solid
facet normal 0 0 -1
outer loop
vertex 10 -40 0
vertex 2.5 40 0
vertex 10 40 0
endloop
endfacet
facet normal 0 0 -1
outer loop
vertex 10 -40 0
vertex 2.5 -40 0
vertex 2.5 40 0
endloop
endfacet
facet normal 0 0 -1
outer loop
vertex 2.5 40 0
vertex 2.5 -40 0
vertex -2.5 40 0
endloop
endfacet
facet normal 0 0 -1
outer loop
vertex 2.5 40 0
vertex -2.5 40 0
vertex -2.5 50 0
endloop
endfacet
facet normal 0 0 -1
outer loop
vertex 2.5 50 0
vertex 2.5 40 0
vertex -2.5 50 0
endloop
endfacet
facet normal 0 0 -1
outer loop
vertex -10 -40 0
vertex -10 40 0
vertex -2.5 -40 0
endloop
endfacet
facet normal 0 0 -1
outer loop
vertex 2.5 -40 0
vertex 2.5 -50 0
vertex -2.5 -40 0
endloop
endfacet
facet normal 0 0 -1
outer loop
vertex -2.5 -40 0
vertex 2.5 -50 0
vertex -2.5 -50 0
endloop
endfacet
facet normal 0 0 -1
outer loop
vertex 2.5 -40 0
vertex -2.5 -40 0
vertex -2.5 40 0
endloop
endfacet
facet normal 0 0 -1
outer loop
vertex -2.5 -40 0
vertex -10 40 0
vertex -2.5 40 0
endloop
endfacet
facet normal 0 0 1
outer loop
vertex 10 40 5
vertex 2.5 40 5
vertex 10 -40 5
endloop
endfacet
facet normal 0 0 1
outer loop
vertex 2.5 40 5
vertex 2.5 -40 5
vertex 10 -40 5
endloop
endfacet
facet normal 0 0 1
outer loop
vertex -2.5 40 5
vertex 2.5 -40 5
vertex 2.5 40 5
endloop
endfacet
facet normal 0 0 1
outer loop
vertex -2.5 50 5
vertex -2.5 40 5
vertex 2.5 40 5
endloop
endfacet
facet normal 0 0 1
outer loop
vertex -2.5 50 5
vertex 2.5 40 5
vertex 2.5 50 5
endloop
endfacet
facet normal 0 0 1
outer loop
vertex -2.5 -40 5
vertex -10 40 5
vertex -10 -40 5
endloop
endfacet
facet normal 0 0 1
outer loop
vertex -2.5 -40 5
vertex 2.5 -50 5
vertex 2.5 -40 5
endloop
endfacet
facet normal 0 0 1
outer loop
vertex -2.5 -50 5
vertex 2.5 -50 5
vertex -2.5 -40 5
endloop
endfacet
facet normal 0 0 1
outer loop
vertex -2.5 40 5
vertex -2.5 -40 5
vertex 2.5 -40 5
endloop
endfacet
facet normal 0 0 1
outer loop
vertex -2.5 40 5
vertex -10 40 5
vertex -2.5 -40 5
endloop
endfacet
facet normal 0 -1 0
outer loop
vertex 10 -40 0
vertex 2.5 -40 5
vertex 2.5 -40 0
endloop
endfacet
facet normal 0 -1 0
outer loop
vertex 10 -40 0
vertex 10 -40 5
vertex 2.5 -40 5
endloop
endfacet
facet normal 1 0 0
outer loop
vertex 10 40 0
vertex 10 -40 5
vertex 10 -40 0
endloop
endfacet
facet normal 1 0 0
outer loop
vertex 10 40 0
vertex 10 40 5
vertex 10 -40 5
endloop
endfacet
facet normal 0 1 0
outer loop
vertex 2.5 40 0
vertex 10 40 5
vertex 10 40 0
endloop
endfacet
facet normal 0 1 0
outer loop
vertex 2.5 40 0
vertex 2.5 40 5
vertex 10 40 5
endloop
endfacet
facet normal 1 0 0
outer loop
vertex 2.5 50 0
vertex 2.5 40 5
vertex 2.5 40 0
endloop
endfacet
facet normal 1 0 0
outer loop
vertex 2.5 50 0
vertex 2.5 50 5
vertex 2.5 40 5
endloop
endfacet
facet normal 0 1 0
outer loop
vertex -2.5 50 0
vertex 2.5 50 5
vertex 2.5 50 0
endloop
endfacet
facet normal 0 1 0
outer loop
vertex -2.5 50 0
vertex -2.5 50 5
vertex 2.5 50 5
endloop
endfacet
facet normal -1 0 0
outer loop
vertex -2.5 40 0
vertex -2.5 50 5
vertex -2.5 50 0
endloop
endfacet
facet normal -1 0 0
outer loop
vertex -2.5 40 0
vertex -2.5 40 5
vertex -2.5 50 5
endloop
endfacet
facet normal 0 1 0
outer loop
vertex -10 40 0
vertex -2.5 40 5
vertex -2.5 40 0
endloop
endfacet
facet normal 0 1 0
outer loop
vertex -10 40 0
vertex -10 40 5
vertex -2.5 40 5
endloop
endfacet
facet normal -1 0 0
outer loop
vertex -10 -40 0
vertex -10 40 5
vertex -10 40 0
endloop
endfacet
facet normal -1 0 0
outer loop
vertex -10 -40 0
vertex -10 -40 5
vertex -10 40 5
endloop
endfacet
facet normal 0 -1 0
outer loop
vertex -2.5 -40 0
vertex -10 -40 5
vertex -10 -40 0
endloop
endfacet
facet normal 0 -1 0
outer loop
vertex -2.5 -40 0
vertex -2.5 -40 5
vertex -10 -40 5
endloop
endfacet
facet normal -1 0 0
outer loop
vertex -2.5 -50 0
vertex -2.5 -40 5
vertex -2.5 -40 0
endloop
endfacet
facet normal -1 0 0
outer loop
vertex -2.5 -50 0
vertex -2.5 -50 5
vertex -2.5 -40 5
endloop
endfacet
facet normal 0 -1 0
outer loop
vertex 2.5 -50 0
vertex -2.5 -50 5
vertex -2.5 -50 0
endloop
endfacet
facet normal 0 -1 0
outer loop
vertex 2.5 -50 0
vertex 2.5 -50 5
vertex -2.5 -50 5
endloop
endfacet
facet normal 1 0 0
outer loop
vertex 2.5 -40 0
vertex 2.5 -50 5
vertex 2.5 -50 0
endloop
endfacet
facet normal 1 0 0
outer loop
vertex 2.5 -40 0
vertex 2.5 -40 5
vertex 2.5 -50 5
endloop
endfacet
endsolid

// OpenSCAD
//Air Valve Prototype

//Variables
bladeH = 80;
bladeW = 20;
gearT = 5;
jointT = 5;
jointW = 5;

//Blade
module blade() {
    square([bladeW,bladeH],center=true);
    square([jointW,bladeH+2*(gearT+jointT)],center=true);
}

linear_extrude(height=5)blade();
